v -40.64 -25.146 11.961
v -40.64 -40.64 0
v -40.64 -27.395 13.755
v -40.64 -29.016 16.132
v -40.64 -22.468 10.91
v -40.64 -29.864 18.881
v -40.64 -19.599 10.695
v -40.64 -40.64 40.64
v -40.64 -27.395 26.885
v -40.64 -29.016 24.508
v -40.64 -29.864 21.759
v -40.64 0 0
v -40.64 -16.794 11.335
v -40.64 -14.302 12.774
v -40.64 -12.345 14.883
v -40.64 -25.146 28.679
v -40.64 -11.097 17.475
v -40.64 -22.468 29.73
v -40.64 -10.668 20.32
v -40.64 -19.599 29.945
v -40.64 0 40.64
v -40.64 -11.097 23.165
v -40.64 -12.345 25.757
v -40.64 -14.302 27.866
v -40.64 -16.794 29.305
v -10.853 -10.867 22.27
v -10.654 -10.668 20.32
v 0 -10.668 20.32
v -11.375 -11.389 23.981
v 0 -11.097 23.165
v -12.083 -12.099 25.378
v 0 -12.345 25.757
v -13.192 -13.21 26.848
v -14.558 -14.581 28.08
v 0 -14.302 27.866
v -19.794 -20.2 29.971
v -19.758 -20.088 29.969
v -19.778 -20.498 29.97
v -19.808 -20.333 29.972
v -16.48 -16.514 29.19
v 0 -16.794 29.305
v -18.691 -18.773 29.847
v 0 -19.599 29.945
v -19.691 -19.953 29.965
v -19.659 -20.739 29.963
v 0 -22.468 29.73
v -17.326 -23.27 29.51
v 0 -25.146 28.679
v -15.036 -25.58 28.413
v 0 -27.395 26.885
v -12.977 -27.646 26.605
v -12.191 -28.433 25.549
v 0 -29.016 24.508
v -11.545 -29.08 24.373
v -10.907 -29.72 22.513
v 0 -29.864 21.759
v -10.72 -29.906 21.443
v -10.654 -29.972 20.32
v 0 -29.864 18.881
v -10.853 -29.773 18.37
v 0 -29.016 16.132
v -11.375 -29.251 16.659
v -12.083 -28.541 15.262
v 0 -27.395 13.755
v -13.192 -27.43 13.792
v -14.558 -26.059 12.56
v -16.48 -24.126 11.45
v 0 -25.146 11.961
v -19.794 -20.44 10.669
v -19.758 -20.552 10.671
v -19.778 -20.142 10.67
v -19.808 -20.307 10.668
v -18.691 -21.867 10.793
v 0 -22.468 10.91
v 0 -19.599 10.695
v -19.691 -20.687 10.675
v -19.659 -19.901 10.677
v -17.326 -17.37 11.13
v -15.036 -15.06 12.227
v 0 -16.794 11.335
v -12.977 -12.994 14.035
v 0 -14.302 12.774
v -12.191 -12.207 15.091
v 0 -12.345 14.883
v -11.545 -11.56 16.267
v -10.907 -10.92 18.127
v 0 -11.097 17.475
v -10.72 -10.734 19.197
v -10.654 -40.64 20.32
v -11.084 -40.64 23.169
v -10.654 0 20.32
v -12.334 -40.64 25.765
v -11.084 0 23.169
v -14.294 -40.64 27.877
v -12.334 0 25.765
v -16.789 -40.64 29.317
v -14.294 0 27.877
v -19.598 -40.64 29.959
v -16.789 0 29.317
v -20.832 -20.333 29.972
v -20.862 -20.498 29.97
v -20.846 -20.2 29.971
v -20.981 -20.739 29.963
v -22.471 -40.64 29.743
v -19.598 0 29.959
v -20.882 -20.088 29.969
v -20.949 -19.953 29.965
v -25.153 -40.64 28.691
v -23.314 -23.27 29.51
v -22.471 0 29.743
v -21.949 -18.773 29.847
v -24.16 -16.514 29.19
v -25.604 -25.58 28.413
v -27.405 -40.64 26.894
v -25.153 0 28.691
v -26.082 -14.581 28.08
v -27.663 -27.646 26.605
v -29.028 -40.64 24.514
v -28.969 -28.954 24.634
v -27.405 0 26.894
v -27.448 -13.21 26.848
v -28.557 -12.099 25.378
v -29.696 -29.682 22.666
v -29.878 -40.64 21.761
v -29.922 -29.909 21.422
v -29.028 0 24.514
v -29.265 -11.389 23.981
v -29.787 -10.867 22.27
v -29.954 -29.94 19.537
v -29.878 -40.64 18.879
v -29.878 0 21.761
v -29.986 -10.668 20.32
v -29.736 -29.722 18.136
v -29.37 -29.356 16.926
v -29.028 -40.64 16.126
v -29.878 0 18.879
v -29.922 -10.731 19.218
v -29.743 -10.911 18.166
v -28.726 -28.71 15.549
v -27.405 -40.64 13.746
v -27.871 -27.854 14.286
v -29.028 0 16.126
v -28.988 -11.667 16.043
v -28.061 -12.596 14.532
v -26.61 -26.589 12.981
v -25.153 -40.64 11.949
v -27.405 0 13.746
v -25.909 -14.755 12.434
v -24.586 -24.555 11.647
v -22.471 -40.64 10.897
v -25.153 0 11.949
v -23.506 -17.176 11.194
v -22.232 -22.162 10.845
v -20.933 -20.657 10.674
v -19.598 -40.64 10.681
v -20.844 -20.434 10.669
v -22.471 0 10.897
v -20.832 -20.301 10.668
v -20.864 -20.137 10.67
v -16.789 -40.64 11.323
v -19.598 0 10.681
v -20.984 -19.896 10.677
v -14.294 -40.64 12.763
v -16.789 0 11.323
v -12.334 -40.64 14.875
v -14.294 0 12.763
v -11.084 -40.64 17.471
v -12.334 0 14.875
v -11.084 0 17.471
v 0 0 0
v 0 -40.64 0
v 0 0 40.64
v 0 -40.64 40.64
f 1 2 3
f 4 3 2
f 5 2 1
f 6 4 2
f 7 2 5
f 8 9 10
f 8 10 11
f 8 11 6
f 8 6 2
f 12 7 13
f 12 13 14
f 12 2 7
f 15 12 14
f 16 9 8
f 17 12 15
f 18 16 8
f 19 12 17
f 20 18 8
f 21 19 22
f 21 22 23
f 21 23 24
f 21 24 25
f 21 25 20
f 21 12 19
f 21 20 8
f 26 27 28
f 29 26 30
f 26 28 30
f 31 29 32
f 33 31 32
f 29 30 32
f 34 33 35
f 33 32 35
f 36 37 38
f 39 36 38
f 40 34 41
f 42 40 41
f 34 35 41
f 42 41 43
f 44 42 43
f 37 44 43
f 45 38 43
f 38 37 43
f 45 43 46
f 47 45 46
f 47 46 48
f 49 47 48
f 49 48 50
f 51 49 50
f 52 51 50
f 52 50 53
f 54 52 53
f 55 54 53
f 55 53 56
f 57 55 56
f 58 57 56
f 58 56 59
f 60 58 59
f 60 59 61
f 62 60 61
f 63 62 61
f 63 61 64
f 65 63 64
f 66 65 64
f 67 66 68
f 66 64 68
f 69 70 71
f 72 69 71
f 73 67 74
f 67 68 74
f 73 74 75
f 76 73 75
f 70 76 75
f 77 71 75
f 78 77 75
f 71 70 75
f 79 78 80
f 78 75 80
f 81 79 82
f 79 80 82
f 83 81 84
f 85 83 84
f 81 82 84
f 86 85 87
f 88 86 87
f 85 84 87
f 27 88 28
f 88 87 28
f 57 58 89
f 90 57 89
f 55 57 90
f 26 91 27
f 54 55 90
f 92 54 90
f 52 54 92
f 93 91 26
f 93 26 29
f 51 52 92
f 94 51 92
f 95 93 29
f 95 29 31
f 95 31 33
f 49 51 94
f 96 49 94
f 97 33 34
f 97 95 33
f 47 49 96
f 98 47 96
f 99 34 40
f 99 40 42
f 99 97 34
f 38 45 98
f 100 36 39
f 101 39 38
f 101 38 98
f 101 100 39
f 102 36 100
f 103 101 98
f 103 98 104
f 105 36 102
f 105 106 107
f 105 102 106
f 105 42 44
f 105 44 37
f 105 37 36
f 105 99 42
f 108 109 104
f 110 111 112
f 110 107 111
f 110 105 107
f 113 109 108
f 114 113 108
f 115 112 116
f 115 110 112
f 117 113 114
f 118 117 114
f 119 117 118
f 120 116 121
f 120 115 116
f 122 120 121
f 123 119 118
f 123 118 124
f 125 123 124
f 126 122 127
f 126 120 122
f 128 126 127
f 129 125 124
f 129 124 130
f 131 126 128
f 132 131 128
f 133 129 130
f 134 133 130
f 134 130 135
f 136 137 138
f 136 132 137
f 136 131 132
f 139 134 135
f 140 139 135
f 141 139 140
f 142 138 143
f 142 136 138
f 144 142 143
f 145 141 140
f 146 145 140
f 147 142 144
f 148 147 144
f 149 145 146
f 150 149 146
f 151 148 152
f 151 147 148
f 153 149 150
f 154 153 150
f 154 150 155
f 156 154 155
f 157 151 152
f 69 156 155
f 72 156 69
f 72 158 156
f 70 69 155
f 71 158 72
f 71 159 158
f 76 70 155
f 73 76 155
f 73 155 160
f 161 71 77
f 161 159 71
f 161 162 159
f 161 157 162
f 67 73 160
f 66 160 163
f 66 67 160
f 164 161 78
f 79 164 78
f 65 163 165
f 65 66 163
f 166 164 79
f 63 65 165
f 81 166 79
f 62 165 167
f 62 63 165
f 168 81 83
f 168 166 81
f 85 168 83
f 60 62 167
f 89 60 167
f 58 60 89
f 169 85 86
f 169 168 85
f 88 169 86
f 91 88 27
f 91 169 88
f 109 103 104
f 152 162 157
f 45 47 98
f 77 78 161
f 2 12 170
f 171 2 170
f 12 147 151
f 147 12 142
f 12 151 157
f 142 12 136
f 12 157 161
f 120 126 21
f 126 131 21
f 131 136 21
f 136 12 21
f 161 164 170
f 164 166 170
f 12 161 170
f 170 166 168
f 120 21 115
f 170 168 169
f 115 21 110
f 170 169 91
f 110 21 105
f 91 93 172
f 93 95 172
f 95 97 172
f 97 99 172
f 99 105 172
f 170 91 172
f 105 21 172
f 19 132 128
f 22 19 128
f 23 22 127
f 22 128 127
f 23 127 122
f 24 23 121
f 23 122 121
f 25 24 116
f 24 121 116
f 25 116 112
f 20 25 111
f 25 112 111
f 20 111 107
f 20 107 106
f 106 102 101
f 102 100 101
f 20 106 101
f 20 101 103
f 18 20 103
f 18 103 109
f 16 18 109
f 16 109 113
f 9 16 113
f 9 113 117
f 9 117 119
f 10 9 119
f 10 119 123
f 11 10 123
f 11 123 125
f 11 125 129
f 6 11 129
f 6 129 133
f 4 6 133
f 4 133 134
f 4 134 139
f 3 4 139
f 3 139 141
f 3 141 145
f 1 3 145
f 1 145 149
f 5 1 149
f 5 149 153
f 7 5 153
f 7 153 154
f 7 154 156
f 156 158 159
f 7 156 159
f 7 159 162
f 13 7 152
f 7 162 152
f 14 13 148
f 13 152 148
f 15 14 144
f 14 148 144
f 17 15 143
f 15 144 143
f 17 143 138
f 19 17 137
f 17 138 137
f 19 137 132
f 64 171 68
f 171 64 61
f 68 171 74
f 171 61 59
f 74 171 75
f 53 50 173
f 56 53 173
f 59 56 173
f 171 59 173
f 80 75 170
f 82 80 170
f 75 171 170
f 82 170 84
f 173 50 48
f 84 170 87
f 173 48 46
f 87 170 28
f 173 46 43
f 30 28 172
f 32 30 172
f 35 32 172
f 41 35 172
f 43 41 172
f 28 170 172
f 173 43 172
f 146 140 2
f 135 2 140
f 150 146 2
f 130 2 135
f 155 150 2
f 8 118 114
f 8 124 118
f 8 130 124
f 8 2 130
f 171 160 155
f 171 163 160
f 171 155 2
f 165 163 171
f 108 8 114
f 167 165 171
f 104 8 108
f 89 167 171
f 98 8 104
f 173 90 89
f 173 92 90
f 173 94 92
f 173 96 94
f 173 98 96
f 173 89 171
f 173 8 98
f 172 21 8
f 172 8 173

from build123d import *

# Parameters (mm, degrees)
F0_W     = 40.64
F0_H     = 40.64
F0_R     = 9.665554
F1_DEPTH = 40.64
F2_R     = 9.652
F3_DEPTH = 40.641


with BuildPart() as f1:
    # F0 (on Front) → F1 (new body)
    with BuildSketch(Plane.XZ):
        with Locations((-20.32, 20.32)):
            Rectangle(F0_W, F0_H)
        with Locations((-20.32, 20.32)):
            Circle(F0_R, mode=Mode.SUBTRACT)
    extrude(amount=F1_DEPTH)

    # F2 (on face) → F3 (cut, through all)
    with BuildSketch(Plane.YZ):
        with Locations((-20.32, 20.32)):
            Circle(F2_R)
    extrude(amount=-F3_DEPTH, mode=Mode.SUBTRACT)


solid = f1.part
